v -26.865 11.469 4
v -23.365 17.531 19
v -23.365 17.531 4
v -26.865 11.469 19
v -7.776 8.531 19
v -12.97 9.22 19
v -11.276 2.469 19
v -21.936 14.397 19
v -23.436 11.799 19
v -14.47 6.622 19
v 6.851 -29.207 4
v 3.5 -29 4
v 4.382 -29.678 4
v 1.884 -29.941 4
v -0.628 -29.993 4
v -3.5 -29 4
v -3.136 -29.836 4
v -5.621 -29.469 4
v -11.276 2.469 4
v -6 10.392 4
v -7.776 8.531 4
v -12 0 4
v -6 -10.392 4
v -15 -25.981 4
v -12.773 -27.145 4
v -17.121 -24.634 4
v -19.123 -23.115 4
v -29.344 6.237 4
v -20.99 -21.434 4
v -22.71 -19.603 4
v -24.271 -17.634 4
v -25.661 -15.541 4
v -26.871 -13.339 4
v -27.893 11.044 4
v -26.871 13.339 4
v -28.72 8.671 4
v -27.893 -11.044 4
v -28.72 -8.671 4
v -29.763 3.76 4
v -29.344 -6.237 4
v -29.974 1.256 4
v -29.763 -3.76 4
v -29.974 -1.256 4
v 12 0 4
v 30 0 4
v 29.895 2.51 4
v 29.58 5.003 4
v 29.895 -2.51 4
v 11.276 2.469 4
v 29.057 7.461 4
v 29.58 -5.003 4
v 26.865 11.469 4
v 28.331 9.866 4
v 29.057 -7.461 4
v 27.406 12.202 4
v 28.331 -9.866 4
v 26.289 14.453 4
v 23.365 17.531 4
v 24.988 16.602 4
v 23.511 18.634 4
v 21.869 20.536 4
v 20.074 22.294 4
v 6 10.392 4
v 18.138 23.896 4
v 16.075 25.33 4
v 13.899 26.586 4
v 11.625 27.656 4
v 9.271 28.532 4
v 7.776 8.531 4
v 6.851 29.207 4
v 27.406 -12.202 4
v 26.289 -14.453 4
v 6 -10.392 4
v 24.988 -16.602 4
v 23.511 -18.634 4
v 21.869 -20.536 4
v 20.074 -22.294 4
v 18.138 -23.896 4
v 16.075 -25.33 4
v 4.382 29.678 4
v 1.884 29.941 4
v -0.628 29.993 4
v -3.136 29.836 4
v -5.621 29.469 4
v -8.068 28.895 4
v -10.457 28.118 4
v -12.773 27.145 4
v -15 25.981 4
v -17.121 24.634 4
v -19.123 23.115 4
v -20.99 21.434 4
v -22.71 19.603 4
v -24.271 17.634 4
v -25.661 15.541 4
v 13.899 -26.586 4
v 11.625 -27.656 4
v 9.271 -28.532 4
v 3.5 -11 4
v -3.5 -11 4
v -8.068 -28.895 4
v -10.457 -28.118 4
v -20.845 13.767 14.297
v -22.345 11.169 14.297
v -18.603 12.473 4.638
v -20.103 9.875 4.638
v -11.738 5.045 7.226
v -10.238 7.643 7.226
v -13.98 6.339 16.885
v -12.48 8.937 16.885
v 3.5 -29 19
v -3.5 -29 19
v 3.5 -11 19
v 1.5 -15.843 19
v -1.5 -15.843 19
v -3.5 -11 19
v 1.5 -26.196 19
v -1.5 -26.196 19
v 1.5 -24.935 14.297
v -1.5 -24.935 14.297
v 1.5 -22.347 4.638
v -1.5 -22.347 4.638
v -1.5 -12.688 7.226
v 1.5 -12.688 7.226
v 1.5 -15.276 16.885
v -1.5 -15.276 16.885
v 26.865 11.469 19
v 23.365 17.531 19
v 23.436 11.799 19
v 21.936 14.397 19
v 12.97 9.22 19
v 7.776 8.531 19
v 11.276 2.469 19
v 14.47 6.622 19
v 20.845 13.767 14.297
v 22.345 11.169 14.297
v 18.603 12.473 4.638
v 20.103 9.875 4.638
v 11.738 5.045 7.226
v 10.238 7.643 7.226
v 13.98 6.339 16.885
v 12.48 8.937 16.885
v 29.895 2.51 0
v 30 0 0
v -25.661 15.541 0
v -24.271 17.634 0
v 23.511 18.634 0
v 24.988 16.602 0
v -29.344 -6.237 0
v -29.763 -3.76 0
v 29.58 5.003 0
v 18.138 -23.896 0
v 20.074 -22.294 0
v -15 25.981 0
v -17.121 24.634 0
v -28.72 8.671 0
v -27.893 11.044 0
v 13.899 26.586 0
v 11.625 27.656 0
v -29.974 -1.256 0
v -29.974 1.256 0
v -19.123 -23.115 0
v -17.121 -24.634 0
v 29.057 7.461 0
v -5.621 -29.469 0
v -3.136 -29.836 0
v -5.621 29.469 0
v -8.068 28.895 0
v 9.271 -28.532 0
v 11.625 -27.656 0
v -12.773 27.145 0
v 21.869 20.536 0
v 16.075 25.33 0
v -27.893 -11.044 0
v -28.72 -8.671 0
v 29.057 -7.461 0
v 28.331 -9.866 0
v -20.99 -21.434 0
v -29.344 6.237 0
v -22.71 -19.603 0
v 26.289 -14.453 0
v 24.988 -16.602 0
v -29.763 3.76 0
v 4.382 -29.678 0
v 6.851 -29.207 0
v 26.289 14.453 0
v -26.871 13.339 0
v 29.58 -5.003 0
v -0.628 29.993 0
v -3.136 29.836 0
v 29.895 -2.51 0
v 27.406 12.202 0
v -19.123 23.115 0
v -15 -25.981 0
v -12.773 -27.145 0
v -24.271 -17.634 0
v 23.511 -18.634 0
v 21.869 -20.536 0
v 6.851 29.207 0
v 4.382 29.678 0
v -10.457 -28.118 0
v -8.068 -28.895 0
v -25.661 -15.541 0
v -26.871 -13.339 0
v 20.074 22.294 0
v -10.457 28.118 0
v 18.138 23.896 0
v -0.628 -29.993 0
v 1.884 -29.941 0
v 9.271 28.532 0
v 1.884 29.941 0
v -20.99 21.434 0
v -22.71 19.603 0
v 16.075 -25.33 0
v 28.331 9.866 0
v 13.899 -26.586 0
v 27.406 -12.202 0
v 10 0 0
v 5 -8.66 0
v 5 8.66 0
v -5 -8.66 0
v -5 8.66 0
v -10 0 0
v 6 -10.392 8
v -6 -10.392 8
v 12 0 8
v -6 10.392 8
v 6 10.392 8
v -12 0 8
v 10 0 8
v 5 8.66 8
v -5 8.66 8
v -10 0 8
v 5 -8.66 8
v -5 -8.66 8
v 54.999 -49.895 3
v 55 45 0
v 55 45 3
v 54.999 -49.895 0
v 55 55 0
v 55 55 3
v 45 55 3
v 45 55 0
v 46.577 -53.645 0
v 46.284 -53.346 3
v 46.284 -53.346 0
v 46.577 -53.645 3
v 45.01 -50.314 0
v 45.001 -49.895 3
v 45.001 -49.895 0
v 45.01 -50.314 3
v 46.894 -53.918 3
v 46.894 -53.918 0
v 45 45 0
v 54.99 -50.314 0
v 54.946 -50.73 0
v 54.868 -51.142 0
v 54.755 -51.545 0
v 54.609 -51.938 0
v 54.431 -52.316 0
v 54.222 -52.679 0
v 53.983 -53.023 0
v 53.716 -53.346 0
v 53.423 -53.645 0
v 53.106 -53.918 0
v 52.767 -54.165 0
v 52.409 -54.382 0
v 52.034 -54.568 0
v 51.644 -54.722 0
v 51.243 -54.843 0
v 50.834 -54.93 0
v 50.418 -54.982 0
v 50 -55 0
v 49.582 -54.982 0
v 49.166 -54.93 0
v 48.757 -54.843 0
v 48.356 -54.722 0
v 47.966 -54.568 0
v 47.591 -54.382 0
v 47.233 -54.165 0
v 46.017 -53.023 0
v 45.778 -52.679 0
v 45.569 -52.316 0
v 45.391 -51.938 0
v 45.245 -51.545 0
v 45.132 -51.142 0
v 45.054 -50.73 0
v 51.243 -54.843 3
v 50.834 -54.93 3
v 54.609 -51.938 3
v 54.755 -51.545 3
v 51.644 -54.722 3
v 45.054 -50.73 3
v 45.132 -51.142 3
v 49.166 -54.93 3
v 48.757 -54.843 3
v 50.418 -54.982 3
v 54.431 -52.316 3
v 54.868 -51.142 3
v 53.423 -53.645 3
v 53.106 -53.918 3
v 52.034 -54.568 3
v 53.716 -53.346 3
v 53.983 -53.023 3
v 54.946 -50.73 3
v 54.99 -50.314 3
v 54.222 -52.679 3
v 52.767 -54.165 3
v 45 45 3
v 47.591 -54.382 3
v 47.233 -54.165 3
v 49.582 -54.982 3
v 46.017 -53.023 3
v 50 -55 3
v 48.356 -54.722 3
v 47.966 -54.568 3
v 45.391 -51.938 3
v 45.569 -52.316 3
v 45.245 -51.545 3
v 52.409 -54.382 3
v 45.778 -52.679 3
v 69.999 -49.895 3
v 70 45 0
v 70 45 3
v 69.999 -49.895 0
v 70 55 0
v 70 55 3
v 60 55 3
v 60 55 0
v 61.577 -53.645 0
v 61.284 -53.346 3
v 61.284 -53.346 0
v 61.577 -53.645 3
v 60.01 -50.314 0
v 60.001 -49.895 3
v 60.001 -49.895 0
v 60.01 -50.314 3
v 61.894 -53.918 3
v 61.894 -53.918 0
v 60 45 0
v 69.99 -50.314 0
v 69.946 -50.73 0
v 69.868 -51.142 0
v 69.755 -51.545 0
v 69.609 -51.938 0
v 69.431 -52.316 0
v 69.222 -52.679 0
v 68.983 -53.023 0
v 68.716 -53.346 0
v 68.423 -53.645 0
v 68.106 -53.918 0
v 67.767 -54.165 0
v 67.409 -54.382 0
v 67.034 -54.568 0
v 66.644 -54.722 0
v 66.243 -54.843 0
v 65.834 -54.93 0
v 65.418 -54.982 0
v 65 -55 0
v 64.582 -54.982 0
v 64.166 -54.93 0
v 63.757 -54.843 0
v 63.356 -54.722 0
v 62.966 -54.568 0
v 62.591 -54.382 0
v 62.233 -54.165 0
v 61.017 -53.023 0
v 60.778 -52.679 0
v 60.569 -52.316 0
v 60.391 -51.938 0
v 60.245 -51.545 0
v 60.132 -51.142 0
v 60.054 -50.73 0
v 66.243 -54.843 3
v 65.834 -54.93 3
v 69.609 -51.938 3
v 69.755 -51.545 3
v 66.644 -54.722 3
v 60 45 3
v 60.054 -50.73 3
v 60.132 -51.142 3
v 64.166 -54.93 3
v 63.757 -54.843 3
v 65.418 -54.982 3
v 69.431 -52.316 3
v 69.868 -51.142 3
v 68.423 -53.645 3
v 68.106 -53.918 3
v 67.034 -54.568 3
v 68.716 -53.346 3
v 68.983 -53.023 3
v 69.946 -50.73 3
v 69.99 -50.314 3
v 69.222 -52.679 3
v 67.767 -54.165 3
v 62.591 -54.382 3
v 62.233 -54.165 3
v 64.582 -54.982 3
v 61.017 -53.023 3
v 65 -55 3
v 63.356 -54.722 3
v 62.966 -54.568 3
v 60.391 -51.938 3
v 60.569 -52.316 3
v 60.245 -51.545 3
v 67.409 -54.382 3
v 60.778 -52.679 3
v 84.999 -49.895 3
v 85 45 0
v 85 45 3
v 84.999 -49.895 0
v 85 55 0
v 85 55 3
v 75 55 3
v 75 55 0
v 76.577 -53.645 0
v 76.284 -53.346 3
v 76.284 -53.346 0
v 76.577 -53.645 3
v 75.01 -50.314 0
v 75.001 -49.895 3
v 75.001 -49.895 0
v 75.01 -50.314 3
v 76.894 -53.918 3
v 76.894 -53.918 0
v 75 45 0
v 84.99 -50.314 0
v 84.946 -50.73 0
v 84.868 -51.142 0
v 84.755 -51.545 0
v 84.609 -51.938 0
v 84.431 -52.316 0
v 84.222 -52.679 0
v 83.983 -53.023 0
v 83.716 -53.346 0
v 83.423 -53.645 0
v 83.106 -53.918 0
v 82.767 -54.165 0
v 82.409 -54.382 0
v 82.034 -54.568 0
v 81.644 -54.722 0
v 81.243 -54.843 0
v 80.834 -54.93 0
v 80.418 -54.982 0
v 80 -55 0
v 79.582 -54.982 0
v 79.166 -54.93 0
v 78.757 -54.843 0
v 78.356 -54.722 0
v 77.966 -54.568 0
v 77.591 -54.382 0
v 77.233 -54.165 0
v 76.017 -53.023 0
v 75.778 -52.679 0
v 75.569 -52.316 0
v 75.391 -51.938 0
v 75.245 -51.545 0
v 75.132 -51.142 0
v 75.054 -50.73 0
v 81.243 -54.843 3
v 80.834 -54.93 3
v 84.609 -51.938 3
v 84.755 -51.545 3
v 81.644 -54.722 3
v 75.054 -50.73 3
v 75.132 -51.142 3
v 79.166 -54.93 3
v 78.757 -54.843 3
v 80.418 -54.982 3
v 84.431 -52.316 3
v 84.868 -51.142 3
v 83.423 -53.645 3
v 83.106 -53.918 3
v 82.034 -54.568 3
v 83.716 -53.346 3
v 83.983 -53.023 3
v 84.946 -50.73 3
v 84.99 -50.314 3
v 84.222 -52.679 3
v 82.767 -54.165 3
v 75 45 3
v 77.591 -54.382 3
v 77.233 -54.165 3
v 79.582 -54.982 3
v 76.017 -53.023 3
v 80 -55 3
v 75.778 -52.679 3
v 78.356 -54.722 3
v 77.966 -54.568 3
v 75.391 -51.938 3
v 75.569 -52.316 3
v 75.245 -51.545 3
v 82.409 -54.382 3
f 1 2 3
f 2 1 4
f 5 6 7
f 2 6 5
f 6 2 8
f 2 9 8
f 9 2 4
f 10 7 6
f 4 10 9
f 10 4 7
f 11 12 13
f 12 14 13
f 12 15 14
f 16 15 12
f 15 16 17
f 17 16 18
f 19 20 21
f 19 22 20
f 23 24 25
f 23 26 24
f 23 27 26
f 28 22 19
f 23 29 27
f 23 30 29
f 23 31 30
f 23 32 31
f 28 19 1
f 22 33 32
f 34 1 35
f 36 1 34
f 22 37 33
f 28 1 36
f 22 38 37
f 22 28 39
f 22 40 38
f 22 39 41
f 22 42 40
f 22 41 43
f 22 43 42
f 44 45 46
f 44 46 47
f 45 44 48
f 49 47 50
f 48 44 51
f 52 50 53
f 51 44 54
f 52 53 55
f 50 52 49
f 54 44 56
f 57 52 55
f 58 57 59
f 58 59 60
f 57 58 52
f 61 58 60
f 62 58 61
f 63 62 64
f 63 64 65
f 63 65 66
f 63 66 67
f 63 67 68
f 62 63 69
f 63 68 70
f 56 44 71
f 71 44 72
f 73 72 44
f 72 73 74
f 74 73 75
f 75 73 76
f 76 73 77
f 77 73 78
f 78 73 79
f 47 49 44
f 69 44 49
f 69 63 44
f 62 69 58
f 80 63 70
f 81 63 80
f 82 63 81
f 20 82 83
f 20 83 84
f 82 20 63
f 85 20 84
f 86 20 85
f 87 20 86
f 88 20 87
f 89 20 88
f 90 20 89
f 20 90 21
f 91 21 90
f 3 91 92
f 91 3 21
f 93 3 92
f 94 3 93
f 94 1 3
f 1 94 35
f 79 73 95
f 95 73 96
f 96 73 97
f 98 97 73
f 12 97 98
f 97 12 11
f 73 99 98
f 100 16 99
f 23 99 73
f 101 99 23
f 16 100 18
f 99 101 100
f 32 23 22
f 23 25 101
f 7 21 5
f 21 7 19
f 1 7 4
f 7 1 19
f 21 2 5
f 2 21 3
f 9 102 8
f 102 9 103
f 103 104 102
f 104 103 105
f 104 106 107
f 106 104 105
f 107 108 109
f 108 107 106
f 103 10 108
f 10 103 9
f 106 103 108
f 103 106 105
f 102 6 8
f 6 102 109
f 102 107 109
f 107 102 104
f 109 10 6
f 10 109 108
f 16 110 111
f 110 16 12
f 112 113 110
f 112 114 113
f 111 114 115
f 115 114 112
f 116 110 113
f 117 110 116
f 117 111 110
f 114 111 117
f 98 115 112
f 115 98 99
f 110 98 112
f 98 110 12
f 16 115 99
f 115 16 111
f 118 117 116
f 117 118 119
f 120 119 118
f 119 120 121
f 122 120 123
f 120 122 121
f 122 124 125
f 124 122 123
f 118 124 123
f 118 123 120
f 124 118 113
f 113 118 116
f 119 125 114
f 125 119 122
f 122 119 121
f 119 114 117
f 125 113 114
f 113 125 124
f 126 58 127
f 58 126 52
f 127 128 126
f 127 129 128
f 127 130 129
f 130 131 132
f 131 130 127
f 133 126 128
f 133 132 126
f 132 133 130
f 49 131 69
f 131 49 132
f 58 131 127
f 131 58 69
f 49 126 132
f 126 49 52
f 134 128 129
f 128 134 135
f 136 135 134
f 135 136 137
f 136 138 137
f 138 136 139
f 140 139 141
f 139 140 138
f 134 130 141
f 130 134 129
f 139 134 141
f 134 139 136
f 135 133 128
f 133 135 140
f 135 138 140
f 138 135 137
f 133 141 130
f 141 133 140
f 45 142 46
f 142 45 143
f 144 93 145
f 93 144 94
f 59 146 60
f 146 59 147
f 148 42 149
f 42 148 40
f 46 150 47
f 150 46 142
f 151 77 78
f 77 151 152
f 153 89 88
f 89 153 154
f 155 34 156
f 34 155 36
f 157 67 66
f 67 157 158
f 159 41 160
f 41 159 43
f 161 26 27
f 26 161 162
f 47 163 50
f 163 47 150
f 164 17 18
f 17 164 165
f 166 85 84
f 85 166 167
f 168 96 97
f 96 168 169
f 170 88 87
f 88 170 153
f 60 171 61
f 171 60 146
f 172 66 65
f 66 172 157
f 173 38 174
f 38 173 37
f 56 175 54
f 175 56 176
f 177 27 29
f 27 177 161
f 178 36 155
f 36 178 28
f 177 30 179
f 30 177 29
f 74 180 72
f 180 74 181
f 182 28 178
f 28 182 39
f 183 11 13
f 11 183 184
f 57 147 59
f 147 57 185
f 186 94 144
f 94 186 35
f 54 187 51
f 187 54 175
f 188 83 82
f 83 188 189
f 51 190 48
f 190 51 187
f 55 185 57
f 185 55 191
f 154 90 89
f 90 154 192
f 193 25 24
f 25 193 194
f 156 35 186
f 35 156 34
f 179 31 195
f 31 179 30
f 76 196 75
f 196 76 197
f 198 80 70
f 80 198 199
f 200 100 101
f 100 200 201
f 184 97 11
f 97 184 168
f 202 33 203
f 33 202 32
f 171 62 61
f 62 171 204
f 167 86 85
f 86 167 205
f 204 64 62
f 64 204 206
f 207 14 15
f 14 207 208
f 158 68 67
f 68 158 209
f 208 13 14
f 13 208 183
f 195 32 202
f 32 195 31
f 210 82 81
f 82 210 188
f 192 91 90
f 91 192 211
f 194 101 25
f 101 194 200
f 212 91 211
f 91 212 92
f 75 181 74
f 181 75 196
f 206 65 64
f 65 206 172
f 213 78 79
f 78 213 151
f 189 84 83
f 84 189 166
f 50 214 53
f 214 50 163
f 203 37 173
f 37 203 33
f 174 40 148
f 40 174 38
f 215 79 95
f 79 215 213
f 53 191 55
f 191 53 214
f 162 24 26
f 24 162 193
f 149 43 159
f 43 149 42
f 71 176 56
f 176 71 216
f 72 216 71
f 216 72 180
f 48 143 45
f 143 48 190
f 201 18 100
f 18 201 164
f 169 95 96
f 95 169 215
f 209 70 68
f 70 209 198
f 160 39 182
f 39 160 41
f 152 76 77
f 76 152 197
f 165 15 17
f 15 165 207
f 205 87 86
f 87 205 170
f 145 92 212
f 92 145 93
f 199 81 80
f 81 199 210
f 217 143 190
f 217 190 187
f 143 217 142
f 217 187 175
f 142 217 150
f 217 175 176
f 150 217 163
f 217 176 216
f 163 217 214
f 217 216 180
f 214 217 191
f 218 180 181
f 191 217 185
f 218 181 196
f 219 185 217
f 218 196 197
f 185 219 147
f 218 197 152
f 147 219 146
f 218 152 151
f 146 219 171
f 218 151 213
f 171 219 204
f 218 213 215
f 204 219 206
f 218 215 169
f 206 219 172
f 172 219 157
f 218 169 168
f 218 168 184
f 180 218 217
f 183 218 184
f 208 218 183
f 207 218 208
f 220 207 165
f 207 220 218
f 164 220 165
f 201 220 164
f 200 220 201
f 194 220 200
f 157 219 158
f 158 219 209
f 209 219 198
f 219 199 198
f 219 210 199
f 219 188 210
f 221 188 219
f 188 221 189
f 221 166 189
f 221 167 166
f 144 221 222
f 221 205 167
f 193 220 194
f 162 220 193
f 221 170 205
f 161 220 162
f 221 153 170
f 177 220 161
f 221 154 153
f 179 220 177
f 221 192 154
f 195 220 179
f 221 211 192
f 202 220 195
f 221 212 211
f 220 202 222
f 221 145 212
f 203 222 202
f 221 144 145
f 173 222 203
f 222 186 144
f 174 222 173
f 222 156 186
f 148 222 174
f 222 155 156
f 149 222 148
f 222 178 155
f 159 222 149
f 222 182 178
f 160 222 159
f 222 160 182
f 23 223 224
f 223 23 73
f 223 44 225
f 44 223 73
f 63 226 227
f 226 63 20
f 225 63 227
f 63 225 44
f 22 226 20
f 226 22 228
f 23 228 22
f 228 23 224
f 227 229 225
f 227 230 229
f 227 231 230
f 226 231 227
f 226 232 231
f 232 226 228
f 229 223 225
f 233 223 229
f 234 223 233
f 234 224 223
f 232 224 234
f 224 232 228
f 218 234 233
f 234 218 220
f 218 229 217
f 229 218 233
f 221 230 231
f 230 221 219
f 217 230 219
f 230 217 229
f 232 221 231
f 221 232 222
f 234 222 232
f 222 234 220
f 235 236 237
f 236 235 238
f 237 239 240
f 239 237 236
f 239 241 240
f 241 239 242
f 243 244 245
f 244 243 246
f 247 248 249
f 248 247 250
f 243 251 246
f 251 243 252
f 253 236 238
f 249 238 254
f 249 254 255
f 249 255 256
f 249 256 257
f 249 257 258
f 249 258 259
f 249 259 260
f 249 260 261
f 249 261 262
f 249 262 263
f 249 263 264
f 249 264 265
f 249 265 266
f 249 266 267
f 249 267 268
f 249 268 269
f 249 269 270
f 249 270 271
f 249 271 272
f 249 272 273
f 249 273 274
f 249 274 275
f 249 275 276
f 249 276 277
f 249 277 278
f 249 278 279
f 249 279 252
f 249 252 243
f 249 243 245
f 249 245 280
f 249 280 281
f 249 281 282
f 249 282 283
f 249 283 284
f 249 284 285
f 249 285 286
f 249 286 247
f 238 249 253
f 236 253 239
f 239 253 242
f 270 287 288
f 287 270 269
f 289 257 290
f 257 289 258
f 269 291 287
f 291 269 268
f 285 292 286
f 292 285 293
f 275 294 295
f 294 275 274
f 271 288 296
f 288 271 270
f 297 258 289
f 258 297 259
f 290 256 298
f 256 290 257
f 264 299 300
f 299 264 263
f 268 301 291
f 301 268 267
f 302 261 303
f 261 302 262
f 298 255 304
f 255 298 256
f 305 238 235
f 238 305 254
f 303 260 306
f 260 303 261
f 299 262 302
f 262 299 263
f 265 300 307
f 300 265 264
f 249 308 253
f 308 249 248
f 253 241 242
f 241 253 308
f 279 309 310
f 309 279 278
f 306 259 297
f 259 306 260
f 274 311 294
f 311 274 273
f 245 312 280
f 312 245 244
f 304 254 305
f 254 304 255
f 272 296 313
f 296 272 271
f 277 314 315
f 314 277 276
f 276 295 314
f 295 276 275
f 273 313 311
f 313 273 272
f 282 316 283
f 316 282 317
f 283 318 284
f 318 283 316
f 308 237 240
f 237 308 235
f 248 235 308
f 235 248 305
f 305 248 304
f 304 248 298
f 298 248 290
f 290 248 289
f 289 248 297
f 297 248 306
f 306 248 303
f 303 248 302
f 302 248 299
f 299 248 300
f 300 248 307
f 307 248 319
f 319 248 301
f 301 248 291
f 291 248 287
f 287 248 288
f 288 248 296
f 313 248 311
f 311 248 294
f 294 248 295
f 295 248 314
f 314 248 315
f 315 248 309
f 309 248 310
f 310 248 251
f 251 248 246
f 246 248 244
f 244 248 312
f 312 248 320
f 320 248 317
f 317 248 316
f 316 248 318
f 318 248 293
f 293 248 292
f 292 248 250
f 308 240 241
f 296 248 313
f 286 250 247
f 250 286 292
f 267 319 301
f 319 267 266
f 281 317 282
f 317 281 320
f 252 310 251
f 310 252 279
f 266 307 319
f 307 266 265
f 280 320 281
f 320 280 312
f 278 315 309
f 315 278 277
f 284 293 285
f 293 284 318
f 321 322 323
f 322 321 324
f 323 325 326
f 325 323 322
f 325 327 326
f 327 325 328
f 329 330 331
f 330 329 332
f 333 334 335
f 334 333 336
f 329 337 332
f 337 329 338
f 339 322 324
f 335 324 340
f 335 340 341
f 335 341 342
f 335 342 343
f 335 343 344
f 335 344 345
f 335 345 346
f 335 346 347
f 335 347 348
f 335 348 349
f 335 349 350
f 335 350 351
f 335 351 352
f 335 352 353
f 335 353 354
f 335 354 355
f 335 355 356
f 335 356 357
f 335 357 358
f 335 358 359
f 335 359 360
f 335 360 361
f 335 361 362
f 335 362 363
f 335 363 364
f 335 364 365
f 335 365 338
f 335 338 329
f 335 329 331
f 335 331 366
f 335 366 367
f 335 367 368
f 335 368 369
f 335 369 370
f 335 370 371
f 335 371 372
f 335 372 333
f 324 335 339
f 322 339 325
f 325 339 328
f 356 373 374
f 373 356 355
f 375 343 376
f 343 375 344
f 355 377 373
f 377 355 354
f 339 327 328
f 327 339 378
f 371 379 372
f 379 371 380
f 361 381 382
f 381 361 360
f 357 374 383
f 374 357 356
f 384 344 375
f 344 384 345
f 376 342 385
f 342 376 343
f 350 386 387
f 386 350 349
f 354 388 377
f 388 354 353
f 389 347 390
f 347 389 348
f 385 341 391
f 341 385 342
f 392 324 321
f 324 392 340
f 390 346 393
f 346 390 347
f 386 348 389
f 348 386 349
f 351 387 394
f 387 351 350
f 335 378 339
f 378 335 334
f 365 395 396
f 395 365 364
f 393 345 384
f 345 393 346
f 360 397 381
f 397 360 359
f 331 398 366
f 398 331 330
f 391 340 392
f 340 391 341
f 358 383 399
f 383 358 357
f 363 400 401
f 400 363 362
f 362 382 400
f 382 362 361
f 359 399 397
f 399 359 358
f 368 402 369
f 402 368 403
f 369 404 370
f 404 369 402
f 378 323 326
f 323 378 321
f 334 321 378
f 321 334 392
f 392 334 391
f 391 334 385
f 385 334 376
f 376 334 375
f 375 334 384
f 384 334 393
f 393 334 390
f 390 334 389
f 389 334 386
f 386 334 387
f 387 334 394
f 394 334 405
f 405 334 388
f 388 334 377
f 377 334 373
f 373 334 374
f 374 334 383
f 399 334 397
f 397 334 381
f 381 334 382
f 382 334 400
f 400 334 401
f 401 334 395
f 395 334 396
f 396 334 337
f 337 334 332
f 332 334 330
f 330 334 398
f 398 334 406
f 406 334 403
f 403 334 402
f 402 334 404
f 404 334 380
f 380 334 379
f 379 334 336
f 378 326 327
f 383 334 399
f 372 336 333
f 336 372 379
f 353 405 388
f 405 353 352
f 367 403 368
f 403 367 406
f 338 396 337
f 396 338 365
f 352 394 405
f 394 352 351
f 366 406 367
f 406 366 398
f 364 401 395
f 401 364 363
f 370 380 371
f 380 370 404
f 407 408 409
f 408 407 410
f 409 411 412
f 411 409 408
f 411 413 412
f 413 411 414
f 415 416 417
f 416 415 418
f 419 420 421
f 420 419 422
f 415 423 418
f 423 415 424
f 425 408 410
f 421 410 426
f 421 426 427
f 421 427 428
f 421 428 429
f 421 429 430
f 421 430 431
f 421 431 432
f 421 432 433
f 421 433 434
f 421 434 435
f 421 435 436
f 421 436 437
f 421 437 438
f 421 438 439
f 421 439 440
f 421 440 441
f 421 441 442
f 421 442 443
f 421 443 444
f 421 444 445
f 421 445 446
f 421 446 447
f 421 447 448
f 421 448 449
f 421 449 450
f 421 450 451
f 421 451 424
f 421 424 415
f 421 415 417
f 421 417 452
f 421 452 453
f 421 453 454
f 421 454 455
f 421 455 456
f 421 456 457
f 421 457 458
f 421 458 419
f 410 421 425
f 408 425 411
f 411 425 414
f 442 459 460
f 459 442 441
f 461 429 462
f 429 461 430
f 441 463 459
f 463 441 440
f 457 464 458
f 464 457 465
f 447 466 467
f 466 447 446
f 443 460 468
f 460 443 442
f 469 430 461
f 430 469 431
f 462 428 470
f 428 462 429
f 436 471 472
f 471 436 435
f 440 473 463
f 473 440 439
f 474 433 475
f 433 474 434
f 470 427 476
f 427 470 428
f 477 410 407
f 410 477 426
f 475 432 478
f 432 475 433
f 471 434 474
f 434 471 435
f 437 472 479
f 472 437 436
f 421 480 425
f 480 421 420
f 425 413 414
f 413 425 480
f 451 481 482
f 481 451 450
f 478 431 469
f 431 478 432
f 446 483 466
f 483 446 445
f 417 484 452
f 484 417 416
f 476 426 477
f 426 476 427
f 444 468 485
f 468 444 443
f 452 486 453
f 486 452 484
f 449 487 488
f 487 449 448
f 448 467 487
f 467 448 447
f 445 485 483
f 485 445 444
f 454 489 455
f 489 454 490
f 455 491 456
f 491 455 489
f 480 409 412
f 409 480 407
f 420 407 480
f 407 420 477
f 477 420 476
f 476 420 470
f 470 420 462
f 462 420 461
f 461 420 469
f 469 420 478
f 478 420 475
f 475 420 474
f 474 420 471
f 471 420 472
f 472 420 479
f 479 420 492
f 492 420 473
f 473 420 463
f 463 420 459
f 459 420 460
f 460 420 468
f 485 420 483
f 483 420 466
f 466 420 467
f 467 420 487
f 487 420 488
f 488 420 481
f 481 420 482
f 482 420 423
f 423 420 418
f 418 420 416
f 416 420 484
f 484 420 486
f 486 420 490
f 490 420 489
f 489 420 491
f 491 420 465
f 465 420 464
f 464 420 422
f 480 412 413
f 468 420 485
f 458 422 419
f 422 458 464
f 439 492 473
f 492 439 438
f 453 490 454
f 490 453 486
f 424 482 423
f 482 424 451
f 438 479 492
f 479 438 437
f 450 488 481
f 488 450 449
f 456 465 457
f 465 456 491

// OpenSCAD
BaseRadius = 30;
BaseHeight = 4;
LegWidth = 10;
LegThicknes = 3;
LegHeight = 100;
LegPlugThickness = 4;
LegAngle = 15;
LegOffset = 0;
// Workarround for slicer software without XY/Horz. Compensation
LegPlugXYCompensation = 0;
HolderRadius=10;
HolderType = "Hexagon"; //[Circle,Hexagon]
DrawType = "All"; //[Head,Legs,All,Demo]

/* [HIDDEN] */
$fn = 75;

if(DrawType == "Head") Head();
if(DrawType == "Demo") rotate([180,0,0])Head();
if(DrawType == "Legs") rotate([90,0,0])Leg();
if(DrawType == "All") {
    Head();
    for(a=[1:3]) 
        translate([BaseRadius+5+a*(LegWidth+5),LegHeight/2,LegThicknes/2])
            rotate([90,0,0])
                Leg();
}

module Head(){
    difference(){
        hFn = HolderType == "Circle" ? 50:6;
        union(){
            Base();
            translate([0,0,BaseHeight]) 
                cylinder(r=HolderRadius+2,h=BaseHeight*2,center=true,$fn=hFn);
        }    
        cylinder(r=HolderRadius,h=100,center=true,$fn=hFn);
    }
}
module Base(){
    cylinder(r=BaseRadius,h=BaseHeight);
    for(a=[1:3]){
        rotate(30+a*120)
            translate([BaseRadius-LegWidth,0,BaseHeight])
                Plug();
    }
}
module Plug(){
    bHeigh = LegWidth*1.5;
    if(DrawType == "Demo"){
        translate([0,0,bHeigh/2]) 
            cube([LegWidth+LegPlugThickness*2,LegThicknes+LegPlugThickness, bHeigh],center=true);
        translate([-3,0,0])
            rotate([0,LegAngle,0]) 
                translate([-LegOffset,0,LegThicknes+4])
                    Leg(LegPlugXYCompensation);
    }
    else{
        difference(){
            translate([0,0,bHeigh/2]) 
                cube([LegWidth+LegPlugThickness*2,LegThicknes+LegPlugThickness, bHeigh],center=true);
            translate([-3,0,0])
                rotate([0,LegAngle,0]) 
                    translate([-LegOffset,0,LegThicknes+4])
                        Leg(LegPlugXYCompensation);
        }
    }
}

module Leg(legThModf=0){
    rotate([90,-90,0]){
        hull(){
            cube([LegWidth+legThModf,LegWidth+legThModf,LegThicknes+legThModf],center=true);
            translate([LegHeight,0,0]) cylinder(d=LegWidth,h=LegThicknes+legThModf,center=true);
        }
    }
}
